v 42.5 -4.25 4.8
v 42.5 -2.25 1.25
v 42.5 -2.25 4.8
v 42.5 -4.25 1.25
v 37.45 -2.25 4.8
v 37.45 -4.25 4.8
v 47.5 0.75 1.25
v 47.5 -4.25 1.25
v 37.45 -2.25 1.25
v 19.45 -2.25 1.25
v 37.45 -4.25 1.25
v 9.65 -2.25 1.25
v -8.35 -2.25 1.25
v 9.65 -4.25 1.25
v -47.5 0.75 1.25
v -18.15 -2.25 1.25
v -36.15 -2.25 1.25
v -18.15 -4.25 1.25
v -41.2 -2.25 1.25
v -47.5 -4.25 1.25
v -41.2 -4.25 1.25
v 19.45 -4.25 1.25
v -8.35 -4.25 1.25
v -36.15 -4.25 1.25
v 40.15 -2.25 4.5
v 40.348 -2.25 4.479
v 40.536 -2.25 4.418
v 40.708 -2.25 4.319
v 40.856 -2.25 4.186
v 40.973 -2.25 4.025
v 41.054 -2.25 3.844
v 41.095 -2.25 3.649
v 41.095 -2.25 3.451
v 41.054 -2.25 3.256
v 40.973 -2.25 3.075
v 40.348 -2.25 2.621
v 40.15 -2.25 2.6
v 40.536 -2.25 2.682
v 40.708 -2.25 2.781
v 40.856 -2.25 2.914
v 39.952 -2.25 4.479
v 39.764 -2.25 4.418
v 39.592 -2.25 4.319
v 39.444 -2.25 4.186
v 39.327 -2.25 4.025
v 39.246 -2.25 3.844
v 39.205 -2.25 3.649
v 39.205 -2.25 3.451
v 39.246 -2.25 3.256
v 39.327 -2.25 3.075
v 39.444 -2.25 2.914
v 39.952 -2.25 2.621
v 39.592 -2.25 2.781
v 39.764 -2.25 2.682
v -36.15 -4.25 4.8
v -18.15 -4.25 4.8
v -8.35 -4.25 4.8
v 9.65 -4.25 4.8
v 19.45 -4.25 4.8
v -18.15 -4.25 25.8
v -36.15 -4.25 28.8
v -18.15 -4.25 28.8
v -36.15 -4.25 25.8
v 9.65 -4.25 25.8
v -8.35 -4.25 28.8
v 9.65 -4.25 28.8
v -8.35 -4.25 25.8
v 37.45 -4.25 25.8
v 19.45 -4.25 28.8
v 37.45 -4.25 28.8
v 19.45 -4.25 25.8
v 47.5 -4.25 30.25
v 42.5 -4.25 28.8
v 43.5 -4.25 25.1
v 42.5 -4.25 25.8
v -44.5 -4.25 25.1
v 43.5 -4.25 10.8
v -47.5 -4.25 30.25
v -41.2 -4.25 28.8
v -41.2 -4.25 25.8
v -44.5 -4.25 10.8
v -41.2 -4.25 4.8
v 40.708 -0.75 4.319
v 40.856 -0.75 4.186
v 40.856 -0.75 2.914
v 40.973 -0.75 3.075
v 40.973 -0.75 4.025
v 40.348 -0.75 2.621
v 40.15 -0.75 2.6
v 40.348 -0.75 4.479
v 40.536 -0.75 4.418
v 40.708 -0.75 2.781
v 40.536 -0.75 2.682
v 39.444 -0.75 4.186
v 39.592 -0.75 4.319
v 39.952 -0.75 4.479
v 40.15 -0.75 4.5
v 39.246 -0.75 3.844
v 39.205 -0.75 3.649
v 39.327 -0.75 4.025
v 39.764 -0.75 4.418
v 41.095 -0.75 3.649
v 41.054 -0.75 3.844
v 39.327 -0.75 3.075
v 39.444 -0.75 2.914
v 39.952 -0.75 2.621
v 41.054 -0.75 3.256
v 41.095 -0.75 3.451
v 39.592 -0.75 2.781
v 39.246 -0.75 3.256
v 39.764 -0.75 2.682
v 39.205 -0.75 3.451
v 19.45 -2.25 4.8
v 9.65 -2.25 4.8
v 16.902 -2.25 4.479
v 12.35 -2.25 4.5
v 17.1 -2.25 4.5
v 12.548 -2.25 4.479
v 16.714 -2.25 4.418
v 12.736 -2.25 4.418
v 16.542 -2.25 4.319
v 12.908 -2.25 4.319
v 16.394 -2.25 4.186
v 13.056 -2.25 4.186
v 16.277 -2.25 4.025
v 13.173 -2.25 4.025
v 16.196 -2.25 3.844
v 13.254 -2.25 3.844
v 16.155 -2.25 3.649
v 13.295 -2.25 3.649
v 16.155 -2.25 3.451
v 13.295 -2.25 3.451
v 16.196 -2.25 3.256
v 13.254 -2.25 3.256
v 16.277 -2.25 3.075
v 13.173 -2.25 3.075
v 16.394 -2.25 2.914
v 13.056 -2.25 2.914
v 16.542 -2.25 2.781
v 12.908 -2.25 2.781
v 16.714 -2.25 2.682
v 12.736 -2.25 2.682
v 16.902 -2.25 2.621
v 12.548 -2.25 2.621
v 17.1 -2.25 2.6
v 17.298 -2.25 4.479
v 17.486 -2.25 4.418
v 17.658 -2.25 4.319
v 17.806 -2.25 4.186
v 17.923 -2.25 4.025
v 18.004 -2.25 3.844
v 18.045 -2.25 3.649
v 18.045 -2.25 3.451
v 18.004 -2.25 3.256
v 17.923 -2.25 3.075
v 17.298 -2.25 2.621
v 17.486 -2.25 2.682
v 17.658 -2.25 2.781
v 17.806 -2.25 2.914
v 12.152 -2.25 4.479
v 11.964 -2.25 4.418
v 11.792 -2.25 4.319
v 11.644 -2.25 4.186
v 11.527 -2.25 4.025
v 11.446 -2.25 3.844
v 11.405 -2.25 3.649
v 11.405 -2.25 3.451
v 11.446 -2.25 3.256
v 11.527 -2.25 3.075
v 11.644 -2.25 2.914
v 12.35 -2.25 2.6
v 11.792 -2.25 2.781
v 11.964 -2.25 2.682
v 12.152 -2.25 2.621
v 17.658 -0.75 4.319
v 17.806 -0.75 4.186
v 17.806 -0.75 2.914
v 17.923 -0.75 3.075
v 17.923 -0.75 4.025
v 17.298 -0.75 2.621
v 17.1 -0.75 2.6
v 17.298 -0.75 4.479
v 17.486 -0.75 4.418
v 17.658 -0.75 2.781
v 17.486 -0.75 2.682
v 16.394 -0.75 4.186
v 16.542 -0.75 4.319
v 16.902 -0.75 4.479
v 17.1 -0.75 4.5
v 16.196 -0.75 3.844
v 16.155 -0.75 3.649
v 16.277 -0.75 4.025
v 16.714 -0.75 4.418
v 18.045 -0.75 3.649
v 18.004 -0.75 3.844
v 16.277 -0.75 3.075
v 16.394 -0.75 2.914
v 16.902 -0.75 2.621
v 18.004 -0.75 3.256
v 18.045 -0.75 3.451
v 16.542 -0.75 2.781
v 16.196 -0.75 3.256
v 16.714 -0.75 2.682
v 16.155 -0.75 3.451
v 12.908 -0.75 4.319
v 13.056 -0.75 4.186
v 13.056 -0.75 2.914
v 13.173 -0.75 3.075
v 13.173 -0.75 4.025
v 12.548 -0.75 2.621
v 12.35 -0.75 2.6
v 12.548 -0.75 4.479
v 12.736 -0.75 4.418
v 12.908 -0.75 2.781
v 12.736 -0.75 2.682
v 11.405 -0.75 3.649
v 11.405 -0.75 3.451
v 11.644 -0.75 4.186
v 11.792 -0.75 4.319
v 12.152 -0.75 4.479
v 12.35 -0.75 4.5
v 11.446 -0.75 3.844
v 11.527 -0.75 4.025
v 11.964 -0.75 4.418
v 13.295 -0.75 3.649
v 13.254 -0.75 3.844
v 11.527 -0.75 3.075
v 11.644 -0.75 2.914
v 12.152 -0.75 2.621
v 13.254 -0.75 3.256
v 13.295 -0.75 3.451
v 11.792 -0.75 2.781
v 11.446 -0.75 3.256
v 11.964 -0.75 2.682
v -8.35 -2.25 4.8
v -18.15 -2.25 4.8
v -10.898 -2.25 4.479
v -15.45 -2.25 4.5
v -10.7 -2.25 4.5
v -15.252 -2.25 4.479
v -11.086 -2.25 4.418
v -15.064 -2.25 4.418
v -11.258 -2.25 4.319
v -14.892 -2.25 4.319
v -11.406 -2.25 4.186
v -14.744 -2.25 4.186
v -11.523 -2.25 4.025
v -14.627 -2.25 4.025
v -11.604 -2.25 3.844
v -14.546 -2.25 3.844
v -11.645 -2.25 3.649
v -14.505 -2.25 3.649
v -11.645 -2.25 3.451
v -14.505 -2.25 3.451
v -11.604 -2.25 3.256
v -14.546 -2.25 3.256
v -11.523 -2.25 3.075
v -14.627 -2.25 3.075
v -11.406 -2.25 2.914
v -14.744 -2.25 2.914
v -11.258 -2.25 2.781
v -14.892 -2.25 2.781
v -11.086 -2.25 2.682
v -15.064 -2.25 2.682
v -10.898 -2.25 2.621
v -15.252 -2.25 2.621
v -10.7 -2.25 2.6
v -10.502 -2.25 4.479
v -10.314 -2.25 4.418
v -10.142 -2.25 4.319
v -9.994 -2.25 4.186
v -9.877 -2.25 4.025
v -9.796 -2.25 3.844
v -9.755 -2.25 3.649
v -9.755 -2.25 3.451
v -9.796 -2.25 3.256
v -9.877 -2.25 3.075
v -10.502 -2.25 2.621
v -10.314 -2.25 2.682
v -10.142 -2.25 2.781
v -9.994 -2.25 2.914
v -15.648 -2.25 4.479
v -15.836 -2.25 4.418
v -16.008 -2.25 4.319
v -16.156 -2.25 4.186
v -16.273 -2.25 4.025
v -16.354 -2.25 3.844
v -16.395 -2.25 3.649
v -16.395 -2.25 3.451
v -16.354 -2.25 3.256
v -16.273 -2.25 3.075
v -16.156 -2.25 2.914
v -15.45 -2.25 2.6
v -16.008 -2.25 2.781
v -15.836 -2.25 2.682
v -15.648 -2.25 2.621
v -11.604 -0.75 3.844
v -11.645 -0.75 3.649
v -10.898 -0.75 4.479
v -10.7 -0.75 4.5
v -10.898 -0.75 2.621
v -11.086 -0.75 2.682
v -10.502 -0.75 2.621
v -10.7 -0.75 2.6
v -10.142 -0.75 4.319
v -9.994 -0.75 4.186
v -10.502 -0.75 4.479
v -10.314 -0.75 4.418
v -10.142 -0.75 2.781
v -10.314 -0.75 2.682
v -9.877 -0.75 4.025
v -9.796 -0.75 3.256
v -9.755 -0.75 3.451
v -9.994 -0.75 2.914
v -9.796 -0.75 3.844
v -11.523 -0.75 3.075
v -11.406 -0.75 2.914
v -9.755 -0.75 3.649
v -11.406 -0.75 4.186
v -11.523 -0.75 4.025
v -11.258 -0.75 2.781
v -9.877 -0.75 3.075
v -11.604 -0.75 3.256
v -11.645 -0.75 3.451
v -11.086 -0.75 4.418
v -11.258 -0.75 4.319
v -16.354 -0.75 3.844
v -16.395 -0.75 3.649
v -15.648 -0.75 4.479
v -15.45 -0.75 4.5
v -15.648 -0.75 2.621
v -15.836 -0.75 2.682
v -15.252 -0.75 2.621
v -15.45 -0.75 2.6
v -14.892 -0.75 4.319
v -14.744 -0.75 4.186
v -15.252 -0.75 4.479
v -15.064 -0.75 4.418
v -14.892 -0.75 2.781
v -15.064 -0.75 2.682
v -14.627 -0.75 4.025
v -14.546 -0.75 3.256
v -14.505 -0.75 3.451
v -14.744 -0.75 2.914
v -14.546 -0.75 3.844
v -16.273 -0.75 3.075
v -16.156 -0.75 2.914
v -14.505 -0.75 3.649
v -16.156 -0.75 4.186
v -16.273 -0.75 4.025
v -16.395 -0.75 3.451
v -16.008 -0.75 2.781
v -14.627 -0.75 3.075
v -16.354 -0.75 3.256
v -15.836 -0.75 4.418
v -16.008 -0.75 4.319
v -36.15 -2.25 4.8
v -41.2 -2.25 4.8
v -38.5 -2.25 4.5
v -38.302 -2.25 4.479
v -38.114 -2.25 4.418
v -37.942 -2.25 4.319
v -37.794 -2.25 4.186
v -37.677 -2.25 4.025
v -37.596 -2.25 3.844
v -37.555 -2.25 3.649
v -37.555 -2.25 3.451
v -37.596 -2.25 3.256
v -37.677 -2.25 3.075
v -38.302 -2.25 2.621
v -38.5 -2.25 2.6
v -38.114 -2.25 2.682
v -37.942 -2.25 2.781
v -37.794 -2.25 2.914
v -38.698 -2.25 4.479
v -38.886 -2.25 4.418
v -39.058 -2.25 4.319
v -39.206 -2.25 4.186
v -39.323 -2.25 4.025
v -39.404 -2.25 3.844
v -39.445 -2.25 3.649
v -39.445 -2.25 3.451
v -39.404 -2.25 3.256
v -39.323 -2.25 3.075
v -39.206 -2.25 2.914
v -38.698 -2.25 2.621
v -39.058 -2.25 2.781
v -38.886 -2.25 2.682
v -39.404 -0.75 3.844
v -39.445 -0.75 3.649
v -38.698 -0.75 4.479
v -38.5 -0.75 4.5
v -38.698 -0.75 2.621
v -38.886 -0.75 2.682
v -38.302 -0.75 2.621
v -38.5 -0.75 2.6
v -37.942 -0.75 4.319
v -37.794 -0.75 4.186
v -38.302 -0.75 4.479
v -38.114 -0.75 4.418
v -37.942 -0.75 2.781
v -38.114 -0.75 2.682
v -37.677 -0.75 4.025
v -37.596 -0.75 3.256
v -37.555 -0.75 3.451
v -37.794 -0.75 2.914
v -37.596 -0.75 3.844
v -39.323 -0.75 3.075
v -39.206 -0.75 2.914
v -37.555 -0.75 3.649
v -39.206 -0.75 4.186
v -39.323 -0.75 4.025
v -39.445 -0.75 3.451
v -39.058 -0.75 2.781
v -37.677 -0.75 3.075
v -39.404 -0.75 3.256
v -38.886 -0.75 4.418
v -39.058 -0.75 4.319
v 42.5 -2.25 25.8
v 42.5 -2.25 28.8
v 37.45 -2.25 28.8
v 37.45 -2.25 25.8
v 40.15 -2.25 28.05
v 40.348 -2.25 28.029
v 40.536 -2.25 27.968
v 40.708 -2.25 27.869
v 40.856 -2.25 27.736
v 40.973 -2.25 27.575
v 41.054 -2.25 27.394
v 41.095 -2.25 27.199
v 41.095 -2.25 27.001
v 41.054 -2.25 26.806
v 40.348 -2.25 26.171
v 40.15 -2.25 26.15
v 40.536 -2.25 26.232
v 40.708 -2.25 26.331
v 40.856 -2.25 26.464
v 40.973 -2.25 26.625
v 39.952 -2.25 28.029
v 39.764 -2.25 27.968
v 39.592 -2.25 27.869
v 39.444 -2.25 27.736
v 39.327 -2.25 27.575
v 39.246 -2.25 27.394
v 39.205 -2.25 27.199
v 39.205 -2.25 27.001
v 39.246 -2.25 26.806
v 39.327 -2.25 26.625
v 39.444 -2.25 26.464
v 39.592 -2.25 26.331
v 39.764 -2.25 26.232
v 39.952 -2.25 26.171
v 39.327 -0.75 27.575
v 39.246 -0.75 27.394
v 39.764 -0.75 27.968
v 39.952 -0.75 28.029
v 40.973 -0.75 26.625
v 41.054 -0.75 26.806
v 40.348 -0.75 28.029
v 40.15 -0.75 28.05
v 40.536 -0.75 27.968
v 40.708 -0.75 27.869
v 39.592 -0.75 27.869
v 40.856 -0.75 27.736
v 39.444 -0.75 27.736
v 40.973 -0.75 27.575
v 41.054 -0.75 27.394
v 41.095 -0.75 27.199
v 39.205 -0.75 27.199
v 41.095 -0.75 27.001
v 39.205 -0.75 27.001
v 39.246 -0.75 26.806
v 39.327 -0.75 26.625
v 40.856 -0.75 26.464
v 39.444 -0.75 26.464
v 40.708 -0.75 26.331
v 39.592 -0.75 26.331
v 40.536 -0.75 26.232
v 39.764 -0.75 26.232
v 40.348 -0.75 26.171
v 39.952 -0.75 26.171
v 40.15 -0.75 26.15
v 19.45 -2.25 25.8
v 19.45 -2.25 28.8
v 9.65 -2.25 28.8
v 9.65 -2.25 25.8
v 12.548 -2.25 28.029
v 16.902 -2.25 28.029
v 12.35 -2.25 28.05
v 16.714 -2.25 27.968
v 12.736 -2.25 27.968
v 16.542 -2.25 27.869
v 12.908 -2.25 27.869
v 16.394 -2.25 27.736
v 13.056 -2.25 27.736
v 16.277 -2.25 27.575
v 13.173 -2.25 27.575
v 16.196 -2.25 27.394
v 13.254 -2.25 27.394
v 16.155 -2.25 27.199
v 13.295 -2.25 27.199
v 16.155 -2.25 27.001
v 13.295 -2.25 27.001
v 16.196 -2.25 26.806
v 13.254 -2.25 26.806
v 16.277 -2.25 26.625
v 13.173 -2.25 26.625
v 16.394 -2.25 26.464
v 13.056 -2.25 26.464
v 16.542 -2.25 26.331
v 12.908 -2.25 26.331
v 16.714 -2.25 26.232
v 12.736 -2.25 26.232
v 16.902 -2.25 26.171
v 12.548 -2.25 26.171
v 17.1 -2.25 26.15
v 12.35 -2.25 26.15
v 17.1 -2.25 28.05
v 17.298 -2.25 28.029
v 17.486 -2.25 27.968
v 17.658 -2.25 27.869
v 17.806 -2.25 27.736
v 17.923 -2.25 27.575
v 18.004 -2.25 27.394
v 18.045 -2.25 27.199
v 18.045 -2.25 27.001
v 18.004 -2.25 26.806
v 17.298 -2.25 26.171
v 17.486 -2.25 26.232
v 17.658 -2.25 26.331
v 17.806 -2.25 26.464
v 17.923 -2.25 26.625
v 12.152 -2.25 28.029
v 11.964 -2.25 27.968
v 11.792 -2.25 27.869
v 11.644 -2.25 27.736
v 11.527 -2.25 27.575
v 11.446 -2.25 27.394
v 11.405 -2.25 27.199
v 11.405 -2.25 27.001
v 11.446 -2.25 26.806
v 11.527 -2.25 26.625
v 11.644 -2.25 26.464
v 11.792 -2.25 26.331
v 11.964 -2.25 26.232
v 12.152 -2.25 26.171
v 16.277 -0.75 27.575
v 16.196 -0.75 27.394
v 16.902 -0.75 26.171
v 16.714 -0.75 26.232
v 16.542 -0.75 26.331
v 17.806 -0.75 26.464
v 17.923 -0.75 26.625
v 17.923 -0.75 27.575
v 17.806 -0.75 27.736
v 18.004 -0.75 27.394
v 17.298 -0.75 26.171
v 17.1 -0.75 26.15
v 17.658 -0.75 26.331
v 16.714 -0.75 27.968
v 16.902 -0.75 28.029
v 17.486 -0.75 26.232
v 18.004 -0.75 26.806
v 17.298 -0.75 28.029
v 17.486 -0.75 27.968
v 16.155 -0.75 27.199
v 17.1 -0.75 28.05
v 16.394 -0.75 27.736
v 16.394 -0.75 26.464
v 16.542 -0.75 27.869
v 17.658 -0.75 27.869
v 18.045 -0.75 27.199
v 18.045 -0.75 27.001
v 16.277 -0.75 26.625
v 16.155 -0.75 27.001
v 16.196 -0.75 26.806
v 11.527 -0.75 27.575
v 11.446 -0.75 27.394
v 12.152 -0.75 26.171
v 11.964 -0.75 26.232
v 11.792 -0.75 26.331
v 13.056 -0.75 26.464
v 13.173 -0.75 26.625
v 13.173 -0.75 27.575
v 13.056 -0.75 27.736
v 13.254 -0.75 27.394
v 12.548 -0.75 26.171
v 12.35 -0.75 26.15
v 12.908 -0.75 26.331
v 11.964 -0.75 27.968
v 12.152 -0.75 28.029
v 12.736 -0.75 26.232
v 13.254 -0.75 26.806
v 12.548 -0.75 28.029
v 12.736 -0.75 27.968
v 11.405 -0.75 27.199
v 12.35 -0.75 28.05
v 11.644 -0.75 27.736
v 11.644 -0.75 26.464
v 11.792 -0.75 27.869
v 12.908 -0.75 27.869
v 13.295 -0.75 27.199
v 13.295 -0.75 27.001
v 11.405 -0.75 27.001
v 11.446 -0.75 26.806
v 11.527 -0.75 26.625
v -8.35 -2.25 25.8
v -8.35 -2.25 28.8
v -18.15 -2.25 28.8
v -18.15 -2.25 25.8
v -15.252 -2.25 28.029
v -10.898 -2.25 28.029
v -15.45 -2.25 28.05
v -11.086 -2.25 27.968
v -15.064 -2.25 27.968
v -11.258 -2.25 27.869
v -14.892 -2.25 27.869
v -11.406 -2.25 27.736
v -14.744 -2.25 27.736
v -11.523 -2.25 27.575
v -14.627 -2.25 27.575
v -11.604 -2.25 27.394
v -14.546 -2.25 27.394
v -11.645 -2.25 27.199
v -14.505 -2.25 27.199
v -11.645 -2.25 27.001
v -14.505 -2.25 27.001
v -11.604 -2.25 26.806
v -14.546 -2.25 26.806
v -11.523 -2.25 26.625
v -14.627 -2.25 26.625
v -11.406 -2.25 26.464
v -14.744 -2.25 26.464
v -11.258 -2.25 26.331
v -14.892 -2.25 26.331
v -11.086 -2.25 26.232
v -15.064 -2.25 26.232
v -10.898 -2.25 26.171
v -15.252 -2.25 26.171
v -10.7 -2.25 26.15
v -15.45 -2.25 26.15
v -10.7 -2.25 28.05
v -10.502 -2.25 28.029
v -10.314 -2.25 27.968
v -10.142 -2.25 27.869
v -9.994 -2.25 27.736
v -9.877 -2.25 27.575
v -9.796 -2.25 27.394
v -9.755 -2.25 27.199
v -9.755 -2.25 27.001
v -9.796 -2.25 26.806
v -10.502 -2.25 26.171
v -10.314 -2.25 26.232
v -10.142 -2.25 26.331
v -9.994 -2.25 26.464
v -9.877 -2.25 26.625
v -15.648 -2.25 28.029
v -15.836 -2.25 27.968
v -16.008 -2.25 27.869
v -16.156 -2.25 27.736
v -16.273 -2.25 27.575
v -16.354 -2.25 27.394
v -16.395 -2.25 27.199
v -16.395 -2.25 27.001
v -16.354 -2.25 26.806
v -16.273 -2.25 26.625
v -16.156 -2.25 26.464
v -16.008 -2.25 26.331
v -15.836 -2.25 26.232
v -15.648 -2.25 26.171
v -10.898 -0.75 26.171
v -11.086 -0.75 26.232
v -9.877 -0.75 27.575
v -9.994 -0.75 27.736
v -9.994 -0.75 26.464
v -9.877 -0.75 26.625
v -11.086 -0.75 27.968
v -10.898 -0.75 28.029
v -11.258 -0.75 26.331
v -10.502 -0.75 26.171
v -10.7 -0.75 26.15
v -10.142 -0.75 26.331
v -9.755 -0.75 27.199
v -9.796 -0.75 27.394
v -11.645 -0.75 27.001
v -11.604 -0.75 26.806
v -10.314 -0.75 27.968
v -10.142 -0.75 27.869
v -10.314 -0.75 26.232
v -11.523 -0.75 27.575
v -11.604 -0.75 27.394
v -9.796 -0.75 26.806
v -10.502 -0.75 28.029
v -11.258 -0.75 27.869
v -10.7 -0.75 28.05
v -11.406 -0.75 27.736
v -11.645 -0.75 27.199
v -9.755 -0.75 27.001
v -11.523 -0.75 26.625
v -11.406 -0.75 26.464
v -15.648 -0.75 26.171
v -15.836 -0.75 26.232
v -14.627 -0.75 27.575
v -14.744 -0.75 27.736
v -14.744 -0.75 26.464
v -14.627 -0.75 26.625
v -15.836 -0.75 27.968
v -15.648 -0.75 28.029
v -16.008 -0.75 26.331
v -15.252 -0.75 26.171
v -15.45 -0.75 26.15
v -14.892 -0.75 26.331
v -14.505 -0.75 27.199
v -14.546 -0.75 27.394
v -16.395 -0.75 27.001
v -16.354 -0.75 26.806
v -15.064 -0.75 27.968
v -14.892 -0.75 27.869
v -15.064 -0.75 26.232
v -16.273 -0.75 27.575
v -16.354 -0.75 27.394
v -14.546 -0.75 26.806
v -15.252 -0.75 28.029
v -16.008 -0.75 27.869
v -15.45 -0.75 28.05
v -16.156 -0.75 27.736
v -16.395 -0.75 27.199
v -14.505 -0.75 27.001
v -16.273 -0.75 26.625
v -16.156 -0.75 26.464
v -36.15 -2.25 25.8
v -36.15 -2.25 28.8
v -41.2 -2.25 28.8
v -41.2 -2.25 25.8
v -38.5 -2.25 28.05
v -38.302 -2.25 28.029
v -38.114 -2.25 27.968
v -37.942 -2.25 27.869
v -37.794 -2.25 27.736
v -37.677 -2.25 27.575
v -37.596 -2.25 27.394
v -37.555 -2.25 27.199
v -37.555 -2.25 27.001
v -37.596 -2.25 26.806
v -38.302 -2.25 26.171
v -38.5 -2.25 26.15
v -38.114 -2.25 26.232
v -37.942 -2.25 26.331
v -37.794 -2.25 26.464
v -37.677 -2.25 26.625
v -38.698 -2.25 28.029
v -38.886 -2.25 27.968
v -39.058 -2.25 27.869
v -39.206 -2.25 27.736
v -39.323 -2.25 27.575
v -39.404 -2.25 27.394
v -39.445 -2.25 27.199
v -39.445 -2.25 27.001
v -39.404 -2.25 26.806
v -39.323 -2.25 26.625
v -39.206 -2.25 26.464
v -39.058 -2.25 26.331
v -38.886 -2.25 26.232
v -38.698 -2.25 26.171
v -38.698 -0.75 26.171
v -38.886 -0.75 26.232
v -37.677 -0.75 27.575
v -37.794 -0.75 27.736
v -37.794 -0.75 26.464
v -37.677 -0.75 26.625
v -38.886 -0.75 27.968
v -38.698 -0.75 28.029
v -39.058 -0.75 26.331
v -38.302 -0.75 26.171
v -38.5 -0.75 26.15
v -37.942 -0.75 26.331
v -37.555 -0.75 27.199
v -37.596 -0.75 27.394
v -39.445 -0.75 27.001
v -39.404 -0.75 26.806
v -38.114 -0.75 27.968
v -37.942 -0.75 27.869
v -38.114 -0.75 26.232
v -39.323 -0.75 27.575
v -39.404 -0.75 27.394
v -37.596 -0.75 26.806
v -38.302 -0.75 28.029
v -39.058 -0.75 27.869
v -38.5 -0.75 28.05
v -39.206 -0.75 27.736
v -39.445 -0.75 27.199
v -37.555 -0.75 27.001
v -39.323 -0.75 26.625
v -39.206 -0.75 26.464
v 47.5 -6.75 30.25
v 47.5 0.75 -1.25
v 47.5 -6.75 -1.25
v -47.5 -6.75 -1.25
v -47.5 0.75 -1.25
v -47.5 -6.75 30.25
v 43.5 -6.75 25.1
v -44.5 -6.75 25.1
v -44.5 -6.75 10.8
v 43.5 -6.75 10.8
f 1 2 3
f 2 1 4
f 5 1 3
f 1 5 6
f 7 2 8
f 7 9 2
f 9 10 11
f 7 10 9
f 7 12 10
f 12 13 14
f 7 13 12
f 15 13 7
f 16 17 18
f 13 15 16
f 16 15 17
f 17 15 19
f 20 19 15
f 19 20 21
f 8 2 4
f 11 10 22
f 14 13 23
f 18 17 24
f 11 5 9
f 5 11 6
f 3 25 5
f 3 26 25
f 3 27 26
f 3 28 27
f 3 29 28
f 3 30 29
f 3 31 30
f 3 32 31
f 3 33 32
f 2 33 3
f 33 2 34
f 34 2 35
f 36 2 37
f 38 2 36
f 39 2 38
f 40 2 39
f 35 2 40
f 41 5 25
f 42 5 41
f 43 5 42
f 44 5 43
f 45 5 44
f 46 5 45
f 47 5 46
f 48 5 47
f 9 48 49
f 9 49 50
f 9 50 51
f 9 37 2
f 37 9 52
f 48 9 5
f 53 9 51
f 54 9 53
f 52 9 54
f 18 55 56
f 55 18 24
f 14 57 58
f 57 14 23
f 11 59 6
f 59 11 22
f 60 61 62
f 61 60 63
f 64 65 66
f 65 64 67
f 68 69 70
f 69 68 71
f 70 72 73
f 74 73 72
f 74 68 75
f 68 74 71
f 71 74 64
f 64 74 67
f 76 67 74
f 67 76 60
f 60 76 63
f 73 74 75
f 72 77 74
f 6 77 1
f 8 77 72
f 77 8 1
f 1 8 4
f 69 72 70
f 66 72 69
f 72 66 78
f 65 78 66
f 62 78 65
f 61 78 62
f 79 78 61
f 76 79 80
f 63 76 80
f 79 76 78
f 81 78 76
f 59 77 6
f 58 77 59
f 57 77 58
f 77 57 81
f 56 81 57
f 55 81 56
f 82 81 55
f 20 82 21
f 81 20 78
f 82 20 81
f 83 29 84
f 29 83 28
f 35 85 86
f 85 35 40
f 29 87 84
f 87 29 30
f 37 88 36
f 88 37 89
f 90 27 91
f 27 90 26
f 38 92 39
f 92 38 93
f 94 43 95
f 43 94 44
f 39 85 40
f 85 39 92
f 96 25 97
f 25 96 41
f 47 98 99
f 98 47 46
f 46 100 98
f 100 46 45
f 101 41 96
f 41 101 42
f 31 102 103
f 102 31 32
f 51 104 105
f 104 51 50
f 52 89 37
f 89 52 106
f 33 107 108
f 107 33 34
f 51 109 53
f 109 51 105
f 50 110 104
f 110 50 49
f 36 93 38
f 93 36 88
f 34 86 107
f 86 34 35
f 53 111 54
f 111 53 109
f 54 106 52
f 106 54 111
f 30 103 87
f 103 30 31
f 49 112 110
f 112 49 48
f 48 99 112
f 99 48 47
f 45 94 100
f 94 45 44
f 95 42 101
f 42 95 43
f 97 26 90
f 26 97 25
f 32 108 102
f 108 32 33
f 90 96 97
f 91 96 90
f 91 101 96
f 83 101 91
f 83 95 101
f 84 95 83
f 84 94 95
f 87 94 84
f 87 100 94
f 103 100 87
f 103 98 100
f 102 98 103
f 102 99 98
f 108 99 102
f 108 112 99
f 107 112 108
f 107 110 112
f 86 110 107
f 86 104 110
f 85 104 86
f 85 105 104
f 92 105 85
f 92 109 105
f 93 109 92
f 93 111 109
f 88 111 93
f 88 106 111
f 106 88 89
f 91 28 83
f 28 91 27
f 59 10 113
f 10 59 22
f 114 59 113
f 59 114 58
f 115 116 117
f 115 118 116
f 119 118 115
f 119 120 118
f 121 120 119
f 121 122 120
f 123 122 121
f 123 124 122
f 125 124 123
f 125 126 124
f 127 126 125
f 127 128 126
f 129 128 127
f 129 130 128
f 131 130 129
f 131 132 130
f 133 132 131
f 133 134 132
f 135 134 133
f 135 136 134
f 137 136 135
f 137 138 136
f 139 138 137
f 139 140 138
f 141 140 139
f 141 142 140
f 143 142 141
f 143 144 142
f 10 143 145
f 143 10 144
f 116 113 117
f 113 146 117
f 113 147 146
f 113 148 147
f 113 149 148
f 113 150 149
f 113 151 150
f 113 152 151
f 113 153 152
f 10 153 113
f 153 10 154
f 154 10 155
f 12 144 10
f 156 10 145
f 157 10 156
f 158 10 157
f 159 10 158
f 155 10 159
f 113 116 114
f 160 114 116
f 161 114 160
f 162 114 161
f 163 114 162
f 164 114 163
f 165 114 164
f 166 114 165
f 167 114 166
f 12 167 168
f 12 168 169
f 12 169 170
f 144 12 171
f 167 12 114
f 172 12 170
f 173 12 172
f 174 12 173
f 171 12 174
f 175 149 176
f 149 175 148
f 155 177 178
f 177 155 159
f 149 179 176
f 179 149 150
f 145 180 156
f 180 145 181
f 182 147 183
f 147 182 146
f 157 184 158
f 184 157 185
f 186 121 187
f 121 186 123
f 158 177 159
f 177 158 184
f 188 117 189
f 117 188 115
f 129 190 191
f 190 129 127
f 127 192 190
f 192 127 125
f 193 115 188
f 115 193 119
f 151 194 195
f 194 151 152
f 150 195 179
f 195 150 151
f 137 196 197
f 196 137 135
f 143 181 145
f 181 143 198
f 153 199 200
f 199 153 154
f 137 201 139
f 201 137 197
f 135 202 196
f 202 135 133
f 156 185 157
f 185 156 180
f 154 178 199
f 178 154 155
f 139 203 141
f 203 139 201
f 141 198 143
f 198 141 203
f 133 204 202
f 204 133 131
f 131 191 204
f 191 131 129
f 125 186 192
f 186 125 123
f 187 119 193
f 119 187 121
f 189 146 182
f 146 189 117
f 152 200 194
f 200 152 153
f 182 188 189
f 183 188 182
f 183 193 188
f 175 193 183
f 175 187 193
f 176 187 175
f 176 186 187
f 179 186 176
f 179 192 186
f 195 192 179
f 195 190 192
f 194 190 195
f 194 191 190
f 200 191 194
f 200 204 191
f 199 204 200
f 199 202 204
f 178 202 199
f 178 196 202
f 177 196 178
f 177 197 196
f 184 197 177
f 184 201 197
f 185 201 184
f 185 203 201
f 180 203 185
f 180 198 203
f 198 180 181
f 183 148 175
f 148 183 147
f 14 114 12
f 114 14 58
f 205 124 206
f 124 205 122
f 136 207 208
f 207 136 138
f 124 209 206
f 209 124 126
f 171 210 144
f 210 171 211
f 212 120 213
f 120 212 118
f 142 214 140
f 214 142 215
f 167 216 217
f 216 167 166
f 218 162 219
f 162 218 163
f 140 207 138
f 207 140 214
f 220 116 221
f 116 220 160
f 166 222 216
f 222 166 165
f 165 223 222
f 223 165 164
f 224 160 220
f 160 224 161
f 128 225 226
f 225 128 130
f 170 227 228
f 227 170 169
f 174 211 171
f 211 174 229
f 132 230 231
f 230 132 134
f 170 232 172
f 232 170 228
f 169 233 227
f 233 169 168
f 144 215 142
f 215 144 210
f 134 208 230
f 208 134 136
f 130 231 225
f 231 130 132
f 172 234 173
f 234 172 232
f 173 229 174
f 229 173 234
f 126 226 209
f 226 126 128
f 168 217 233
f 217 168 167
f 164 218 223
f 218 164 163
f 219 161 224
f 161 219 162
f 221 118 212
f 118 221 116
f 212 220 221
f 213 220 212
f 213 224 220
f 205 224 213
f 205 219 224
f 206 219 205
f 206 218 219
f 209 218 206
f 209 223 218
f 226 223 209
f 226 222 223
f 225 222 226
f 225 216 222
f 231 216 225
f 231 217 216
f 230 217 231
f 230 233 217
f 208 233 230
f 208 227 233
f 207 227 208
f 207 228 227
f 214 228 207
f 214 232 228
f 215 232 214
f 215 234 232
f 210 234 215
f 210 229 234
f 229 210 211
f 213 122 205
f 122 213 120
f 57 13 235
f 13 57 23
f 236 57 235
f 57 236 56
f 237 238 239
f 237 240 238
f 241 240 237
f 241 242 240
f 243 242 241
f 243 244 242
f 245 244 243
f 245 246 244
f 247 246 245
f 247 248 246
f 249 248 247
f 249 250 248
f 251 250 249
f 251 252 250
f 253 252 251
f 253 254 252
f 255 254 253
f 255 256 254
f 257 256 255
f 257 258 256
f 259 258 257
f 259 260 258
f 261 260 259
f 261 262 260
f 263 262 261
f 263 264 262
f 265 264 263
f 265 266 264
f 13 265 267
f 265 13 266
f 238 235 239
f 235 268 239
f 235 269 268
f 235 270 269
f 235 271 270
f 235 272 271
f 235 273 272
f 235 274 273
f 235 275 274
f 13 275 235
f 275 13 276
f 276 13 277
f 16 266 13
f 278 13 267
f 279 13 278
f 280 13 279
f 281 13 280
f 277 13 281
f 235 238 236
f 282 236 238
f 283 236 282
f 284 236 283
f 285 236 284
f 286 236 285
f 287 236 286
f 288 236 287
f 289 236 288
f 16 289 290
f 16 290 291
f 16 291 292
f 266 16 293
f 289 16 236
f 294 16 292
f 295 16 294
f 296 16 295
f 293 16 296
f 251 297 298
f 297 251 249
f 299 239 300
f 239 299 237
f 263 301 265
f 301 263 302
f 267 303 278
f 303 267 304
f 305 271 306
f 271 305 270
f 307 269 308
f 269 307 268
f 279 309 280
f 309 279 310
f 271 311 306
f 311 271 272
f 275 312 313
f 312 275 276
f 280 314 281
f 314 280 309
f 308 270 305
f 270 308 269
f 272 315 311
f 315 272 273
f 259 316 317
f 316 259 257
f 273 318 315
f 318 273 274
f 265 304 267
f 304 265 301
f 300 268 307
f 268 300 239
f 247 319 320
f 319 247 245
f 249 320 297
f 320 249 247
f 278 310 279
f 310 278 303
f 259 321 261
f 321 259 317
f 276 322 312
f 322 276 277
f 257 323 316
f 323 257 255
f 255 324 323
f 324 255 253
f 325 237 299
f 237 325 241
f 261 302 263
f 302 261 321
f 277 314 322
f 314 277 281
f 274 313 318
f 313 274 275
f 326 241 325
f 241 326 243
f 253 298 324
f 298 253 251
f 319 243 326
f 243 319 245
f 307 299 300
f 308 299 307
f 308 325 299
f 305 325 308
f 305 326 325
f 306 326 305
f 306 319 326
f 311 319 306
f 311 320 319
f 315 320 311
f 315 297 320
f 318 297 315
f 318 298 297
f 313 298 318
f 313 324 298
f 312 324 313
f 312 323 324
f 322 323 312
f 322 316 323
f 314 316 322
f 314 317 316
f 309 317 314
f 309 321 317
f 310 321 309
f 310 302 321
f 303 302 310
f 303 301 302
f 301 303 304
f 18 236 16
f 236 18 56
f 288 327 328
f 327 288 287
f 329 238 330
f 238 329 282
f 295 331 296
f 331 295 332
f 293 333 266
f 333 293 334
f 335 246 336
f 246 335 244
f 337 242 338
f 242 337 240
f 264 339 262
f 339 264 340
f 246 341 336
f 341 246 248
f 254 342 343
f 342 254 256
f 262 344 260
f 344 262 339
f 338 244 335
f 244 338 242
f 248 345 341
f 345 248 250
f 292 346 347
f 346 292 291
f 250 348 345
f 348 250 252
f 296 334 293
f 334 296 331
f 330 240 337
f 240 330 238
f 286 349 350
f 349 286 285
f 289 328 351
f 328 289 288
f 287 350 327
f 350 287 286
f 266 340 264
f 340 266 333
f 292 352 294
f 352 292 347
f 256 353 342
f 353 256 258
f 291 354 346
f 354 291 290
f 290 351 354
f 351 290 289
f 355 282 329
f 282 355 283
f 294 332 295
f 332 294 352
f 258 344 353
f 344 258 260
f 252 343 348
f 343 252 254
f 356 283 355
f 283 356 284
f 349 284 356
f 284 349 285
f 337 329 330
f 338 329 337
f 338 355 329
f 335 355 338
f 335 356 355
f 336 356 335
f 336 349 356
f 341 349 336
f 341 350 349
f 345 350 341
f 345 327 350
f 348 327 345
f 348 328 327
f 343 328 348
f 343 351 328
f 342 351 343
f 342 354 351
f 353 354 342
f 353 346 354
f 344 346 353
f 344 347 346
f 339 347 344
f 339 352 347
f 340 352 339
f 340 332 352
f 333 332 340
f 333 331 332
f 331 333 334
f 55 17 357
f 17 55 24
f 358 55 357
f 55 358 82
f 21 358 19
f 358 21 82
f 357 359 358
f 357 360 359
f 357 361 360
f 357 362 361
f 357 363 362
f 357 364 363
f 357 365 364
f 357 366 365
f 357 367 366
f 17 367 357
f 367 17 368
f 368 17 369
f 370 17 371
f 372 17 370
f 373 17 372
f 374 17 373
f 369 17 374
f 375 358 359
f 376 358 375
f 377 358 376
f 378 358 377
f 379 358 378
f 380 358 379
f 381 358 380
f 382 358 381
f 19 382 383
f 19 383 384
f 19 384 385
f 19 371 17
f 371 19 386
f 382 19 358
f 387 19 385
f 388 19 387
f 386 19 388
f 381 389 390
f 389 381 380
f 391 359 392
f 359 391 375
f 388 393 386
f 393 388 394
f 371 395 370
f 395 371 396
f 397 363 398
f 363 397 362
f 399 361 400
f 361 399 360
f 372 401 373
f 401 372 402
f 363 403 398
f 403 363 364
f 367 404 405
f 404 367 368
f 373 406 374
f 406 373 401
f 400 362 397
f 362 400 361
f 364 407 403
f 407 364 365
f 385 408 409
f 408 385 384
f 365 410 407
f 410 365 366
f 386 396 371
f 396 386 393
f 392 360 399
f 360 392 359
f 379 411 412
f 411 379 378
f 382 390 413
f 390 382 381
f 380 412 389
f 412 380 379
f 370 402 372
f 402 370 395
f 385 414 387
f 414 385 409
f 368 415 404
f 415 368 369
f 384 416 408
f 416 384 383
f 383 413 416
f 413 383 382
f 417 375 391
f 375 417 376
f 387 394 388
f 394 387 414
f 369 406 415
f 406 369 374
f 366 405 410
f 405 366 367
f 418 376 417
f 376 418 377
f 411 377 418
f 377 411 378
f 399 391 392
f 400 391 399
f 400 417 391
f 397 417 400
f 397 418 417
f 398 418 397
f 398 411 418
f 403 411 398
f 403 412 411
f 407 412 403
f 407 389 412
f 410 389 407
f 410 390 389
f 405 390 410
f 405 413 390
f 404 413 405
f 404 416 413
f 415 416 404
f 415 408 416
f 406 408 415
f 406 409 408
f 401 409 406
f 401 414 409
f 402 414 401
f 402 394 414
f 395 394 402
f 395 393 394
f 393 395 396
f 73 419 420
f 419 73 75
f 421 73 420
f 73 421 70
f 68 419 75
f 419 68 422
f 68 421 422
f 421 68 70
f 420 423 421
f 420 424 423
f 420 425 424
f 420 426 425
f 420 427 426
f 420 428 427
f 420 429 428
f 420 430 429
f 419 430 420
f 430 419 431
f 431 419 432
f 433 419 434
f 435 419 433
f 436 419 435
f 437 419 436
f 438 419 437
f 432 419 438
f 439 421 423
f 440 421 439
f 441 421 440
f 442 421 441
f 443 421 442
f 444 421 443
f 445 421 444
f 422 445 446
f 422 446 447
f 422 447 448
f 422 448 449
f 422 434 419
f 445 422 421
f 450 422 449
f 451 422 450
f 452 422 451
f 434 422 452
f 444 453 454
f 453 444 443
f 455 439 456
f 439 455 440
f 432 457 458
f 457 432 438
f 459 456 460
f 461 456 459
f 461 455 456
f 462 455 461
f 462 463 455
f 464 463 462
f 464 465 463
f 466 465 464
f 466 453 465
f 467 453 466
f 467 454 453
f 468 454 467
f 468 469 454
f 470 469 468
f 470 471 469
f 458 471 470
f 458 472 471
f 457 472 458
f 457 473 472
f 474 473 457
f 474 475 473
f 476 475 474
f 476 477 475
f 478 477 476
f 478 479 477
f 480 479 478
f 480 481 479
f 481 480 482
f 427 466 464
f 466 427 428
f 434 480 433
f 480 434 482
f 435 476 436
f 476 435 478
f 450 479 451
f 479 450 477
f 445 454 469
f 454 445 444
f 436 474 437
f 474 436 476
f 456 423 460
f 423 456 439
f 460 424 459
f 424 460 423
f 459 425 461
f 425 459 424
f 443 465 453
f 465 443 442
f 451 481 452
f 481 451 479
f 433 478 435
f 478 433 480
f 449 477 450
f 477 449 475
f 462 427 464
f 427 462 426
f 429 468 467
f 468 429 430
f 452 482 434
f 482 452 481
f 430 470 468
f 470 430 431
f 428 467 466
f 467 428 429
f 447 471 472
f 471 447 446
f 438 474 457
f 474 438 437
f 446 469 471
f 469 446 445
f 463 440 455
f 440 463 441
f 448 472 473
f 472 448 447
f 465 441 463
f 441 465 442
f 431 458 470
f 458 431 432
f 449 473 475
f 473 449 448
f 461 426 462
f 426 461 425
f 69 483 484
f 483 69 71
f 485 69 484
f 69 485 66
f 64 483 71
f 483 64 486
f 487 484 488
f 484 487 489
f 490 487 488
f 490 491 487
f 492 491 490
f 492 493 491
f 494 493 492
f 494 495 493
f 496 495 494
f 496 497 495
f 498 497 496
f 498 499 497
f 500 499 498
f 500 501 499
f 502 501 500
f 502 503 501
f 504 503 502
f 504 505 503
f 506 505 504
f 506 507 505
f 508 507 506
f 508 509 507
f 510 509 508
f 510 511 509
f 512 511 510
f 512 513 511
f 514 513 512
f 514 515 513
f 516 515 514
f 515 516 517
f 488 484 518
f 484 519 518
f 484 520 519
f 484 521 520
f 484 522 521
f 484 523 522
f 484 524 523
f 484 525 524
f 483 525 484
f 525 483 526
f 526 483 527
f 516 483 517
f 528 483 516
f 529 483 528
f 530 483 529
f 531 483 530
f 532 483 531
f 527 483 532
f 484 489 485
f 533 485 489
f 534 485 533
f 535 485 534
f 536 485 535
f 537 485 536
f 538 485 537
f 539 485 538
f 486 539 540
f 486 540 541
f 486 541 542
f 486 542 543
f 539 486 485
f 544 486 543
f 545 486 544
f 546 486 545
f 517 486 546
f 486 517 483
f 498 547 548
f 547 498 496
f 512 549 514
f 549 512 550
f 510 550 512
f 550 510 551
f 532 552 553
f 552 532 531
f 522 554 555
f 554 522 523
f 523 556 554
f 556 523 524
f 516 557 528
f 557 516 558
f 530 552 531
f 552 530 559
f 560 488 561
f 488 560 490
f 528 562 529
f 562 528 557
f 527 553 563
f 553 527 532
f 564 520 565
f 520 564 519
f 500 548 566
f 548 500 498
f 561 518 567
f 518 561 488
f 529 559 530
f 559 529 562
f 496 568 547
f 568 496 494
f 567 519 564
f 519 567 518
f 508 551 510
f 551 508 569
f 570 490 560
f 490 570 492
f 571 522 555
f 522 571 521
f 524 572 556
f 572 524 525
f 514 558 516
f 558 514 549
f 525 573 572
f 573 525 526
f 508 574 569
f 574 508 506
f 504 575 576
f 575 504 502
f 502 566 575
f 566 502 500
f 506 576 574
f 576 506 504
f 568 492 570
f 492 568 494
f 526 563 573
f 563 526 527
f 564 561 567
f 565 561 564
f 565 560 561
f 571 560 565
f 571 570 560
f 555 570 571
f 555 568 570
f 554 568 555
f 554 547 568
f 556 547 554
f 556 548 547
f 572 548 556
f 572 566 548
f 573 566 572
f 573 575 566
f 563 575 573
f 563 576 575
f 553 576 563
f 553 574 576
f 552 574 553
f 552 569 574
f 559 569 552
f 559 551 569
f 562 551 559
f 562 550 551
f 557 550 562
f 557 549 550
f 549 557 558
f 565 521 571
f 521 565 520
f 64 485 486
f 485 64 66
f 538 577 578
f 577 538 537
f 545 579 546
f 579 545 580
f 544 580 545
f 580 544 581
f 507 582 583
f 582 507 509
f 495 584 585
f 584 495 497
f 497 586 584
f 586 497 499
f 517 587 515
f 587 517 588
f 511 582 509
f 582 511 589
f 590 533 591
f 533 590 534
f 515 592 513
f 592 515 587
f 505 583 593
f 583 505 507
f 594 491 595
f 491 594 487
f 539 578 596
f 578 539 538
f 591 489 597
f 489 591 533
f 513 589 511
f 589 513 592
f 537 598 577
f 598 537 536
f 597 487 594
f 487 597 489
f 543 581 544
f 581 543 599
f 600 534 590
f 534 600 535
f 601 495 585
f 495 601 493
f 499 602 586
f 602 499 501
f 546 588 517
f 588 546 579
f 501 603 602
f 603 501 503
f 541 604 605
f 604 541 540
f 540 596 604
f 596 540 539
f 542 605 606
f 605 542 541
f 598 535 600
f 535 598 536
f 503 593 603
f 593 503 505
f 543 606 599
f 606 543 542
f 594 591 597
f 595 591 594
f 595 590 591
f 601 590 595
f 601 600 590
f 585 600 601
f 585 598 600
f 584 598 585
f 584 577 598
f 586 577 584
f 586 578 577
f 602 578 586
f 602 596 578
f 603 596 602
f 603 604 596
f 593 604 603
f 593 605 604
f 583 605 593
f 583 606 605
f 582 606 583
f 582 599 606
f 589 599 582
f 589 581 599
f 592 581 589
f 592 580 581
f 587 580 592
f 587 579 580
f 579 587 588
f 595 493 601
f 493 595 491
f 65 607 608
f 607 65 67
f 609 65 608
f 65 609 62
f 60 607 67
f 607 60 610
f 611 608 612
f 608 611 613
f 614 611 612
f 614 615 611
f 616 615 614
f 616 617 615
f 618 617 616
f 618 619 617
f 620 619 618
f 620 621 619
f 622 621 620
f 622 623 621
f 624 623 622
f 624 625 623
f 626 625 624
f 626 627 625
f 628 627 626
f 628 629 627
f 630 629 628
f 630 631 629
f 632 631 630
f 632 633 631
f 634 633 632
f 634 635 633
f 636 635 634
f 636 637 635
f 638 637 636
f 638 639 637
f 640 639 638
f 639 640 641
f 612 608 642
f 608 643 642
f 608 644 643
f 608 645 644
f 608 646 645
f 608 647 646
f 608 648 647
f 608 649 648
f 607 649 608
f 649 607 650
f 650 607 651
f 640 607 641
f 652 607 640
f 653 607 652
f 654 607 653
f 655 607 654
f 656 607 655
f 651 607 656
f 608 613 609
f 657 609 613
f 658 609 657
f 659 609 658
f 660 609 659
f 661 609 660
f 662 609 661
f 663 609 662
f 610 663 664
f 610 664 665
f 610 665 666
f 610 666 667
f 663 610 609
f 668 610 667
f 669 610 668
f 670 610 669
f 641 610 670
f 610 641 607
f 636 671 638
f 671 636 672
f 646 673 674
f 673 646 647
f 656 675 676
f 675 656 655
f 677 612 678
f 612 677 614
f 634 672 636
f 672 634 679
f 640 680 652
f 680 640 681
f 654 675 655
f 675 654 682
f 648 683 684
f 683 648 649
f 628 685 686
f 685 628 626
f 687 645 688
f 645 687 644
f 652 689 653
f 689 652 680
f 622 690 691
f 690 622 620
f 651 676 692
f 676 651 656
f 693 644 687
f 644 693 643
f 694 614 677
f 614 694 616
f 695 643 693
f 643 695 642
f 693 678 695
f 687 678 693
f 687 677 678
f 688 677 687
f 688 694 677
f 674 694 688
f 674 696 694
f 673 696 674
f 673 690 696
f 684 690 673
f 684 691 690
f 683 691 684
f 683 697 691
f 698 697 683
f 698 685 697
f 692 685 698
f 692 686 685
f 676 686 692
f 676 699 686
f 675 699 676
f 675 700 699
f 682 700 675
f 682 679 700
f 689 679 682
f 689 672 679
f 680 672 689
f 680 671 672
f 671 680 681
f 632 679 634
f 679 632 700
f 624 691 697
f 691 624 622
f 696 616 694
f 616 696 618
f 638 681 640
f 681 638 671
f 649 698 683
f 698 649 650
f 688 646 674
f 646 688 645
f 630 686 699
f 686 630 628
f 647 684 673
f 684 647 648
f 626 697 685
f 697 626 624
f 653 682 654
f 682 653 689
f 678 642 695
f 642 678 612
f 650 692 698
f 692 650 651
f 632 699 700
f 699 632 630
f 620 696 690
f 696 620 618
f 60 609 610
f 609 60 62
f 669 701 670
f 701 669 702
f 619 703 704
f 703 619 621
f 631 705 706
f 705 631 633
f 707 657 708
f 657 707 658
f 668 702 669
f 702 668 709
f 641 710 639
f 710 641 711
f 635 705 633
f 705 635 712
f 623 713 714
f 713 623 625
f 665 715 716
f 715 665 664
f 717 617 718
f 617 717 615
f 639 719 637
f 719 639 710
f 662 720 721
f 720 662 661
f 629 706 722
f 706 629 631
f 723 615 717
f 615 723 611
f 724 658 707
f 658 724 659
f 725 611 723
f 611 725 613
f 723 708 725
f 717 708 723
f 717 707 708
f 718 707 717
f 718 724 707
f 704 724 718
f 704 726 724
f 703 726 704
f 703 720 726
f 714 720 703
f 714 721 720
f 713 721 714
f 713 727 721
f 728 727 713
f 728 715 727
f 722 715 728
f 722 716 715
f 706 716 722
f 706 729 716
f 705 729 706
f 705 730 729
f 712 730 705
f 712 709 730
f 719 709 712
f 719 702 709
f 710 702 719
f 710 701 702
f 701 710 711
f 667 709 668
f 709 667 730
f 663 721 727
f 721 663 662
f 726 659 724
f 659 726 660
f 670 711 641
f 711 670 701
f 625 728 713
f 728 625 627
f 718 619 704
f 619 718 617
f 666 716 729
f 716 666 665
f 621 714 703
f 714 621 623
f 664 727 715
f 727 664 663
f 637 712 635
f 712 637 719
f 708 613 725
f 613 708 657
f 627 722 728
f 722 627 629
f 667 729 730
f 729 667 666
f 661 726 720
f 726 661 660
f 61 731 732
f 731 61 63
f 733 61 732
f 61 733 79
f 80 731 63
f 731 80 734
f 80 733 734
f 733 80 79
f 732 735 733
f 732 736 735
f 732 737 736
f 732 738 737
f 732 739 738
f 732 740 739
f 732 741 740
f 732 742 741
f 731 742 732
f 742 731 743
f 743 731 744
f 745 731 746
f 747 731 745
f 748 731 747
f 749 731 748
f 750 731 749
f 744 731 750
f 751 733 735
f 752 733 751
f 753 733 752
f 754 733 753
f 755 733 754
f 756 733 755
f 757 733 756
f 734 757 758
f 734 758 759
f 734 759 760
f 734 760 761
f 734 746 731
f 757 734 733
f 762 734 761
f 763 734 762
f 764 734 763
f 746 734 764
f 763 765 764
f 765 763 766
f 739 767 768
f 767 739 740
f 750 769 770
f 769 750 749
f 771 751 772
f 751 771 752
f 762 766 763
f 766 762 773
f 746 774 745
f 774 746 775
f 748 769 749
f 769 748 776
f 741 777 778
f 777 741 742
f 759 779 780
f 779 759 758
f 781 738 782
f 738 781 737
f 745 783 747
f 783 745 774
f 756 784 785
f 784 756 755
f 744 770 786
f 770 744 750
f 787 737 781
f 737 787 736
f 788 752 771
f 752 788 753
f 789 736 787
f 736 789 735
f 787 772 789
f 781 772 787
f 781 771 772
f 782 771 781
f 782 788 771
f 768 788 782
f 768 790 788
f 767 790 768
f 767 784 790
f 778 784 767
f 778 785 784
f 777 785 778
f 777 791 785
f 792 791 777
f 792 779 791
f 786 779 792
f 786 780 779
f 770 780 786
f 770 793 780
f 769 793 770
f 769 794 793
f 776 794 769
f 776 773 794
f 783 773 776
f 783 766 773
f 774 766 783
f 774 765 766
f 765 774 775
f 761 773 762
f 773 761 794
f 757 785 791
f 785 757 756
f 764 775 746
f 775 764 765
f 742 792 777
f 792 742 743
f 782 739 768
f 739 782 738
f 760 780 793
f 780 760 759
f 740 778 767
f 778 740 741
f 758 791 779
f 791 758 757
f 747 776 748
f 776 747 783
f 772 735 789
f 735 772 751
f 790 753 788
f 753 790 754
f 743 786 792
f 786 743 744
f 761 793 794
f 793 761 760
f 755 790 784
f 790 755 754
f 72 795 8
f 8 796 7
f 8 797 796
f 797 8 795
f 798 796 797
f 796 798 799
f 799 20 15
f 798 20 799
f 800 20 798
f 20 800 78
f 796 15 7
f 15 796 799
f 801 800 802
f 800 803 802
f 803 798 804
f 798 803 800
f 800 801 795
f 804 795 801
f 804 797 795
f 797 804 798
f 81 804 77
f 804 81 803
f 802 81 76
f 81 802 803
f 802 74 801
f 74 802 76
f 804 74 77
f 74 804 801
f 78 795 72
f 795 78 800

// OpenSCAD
$fn = 30; //Fragment Number

//ABSOLUTE POSITIONING OFFSETS (fixed on base plate centring)

ABS_W = 95/2;
ABS_L = 13.5/2;
ABS_H = 2.5/2;


// Base Plate Dims.
BASE_WIDTH = 95;
BASE_LENGTH = 7.5;
BASE_HEIGHT = 2.5;

//Manual Translation for Cube
translate([-ABS_W, -ABS_L, -ABS_H])

cube([BASE_WIDTH,BASE_LENGTH,BASE_HEIGHT]);

//Bottom-Front Wall
translate([-ABS_W, -ABS_L, ABS_H])

cube([BASE_WIDTH,2.5,9.55]);

iX = 5; //Initial X offset

SCREEN_HEIGHT = 14.3;

//Right Border Block
translate([-ABS_W, -ABS_L, ABS_H+9.55])

cube([3,2.5,SCREEN_HEIGHT]);

//Left Border Block
translate([ABS_W-(iX-1), -ABS_L, ABS_H+9.55])
cube([(iX-1),2.5,SCREEN_HEIGHT]);

//Top-Front Wall
translate([-ABS_W, -ABS_L, ABS_H+9.55+SCREEN_HEIGHT])

cube([BASE_WIDTH,2.5,5.15]);


// CUBED WITH EXTRUDING CYLINDER FOR SNAP-FIT ONTO OLED SSD1306 0.96" DISP

module oled_snap_in_block(
XM_offset, ZM_offset,
block_height, back_plate_offset
) {

translate([BASE_WIDTH/2-5.05 - XM_offset, 
-4.25, 
BASE_HEIGHT/2 + ZM_offset + back_plate_offset])

cube([5.05, 2, block_height]);

translate([
BASE_WIDTH/2-1.9/2 - 1.4 - XM_offset,
-0.75,
BASE_HEIGHT/2+1.9/2 + 1.35 + ZM_offset
])

rotate([90, 90, 0])
cylinder(h=1.5, d=1.9);
    
}

//Row Orchastration method

module oled_snap_row(OSW,OSH,OSS,H_up, H_b, BP_o) {
    
//H_b is the Height at which the Row is summoned at (here it's 0 and 19.5)

oled_snap_in_block(iX, H_up, H_b, BP_o);             //OLED 0

oled_snap_in_block(iX+OSS+OSW, H_up, H_b, BP_o);     //OLED 0
oled_snap_in_block(-0.3 + iX+OSS+OSW*2, H_up, H_b, BP_o);  //OLED 1

oled_snap_in_block(-0.3 + iX+OSS*2+OSW*3, H_up, H_b, BP_o); //OLED 1
oled_snap_in_block(-0.6 + iX+OSS*2+OSW*4, H_up, H_b, BP_o); //OLED 2

oled_snap_in_block(-0.6 + iX+OSS*3+OSW*5, H_up, H_b, BP_o); //OLED 2
}

OSW = 5.05; //Oled Snapblock Width
OSH = 4.05; //Oled snapblock height

OSS = 18; //Oled snap spacing

//Bottom Snaps
oled_snap_row(OSW,OSH,OSS,0, 3.55,0);

//Top Snaps
oled_snap_row(OSW,OSH,OSS,OSH+19.5,3.0,1);
